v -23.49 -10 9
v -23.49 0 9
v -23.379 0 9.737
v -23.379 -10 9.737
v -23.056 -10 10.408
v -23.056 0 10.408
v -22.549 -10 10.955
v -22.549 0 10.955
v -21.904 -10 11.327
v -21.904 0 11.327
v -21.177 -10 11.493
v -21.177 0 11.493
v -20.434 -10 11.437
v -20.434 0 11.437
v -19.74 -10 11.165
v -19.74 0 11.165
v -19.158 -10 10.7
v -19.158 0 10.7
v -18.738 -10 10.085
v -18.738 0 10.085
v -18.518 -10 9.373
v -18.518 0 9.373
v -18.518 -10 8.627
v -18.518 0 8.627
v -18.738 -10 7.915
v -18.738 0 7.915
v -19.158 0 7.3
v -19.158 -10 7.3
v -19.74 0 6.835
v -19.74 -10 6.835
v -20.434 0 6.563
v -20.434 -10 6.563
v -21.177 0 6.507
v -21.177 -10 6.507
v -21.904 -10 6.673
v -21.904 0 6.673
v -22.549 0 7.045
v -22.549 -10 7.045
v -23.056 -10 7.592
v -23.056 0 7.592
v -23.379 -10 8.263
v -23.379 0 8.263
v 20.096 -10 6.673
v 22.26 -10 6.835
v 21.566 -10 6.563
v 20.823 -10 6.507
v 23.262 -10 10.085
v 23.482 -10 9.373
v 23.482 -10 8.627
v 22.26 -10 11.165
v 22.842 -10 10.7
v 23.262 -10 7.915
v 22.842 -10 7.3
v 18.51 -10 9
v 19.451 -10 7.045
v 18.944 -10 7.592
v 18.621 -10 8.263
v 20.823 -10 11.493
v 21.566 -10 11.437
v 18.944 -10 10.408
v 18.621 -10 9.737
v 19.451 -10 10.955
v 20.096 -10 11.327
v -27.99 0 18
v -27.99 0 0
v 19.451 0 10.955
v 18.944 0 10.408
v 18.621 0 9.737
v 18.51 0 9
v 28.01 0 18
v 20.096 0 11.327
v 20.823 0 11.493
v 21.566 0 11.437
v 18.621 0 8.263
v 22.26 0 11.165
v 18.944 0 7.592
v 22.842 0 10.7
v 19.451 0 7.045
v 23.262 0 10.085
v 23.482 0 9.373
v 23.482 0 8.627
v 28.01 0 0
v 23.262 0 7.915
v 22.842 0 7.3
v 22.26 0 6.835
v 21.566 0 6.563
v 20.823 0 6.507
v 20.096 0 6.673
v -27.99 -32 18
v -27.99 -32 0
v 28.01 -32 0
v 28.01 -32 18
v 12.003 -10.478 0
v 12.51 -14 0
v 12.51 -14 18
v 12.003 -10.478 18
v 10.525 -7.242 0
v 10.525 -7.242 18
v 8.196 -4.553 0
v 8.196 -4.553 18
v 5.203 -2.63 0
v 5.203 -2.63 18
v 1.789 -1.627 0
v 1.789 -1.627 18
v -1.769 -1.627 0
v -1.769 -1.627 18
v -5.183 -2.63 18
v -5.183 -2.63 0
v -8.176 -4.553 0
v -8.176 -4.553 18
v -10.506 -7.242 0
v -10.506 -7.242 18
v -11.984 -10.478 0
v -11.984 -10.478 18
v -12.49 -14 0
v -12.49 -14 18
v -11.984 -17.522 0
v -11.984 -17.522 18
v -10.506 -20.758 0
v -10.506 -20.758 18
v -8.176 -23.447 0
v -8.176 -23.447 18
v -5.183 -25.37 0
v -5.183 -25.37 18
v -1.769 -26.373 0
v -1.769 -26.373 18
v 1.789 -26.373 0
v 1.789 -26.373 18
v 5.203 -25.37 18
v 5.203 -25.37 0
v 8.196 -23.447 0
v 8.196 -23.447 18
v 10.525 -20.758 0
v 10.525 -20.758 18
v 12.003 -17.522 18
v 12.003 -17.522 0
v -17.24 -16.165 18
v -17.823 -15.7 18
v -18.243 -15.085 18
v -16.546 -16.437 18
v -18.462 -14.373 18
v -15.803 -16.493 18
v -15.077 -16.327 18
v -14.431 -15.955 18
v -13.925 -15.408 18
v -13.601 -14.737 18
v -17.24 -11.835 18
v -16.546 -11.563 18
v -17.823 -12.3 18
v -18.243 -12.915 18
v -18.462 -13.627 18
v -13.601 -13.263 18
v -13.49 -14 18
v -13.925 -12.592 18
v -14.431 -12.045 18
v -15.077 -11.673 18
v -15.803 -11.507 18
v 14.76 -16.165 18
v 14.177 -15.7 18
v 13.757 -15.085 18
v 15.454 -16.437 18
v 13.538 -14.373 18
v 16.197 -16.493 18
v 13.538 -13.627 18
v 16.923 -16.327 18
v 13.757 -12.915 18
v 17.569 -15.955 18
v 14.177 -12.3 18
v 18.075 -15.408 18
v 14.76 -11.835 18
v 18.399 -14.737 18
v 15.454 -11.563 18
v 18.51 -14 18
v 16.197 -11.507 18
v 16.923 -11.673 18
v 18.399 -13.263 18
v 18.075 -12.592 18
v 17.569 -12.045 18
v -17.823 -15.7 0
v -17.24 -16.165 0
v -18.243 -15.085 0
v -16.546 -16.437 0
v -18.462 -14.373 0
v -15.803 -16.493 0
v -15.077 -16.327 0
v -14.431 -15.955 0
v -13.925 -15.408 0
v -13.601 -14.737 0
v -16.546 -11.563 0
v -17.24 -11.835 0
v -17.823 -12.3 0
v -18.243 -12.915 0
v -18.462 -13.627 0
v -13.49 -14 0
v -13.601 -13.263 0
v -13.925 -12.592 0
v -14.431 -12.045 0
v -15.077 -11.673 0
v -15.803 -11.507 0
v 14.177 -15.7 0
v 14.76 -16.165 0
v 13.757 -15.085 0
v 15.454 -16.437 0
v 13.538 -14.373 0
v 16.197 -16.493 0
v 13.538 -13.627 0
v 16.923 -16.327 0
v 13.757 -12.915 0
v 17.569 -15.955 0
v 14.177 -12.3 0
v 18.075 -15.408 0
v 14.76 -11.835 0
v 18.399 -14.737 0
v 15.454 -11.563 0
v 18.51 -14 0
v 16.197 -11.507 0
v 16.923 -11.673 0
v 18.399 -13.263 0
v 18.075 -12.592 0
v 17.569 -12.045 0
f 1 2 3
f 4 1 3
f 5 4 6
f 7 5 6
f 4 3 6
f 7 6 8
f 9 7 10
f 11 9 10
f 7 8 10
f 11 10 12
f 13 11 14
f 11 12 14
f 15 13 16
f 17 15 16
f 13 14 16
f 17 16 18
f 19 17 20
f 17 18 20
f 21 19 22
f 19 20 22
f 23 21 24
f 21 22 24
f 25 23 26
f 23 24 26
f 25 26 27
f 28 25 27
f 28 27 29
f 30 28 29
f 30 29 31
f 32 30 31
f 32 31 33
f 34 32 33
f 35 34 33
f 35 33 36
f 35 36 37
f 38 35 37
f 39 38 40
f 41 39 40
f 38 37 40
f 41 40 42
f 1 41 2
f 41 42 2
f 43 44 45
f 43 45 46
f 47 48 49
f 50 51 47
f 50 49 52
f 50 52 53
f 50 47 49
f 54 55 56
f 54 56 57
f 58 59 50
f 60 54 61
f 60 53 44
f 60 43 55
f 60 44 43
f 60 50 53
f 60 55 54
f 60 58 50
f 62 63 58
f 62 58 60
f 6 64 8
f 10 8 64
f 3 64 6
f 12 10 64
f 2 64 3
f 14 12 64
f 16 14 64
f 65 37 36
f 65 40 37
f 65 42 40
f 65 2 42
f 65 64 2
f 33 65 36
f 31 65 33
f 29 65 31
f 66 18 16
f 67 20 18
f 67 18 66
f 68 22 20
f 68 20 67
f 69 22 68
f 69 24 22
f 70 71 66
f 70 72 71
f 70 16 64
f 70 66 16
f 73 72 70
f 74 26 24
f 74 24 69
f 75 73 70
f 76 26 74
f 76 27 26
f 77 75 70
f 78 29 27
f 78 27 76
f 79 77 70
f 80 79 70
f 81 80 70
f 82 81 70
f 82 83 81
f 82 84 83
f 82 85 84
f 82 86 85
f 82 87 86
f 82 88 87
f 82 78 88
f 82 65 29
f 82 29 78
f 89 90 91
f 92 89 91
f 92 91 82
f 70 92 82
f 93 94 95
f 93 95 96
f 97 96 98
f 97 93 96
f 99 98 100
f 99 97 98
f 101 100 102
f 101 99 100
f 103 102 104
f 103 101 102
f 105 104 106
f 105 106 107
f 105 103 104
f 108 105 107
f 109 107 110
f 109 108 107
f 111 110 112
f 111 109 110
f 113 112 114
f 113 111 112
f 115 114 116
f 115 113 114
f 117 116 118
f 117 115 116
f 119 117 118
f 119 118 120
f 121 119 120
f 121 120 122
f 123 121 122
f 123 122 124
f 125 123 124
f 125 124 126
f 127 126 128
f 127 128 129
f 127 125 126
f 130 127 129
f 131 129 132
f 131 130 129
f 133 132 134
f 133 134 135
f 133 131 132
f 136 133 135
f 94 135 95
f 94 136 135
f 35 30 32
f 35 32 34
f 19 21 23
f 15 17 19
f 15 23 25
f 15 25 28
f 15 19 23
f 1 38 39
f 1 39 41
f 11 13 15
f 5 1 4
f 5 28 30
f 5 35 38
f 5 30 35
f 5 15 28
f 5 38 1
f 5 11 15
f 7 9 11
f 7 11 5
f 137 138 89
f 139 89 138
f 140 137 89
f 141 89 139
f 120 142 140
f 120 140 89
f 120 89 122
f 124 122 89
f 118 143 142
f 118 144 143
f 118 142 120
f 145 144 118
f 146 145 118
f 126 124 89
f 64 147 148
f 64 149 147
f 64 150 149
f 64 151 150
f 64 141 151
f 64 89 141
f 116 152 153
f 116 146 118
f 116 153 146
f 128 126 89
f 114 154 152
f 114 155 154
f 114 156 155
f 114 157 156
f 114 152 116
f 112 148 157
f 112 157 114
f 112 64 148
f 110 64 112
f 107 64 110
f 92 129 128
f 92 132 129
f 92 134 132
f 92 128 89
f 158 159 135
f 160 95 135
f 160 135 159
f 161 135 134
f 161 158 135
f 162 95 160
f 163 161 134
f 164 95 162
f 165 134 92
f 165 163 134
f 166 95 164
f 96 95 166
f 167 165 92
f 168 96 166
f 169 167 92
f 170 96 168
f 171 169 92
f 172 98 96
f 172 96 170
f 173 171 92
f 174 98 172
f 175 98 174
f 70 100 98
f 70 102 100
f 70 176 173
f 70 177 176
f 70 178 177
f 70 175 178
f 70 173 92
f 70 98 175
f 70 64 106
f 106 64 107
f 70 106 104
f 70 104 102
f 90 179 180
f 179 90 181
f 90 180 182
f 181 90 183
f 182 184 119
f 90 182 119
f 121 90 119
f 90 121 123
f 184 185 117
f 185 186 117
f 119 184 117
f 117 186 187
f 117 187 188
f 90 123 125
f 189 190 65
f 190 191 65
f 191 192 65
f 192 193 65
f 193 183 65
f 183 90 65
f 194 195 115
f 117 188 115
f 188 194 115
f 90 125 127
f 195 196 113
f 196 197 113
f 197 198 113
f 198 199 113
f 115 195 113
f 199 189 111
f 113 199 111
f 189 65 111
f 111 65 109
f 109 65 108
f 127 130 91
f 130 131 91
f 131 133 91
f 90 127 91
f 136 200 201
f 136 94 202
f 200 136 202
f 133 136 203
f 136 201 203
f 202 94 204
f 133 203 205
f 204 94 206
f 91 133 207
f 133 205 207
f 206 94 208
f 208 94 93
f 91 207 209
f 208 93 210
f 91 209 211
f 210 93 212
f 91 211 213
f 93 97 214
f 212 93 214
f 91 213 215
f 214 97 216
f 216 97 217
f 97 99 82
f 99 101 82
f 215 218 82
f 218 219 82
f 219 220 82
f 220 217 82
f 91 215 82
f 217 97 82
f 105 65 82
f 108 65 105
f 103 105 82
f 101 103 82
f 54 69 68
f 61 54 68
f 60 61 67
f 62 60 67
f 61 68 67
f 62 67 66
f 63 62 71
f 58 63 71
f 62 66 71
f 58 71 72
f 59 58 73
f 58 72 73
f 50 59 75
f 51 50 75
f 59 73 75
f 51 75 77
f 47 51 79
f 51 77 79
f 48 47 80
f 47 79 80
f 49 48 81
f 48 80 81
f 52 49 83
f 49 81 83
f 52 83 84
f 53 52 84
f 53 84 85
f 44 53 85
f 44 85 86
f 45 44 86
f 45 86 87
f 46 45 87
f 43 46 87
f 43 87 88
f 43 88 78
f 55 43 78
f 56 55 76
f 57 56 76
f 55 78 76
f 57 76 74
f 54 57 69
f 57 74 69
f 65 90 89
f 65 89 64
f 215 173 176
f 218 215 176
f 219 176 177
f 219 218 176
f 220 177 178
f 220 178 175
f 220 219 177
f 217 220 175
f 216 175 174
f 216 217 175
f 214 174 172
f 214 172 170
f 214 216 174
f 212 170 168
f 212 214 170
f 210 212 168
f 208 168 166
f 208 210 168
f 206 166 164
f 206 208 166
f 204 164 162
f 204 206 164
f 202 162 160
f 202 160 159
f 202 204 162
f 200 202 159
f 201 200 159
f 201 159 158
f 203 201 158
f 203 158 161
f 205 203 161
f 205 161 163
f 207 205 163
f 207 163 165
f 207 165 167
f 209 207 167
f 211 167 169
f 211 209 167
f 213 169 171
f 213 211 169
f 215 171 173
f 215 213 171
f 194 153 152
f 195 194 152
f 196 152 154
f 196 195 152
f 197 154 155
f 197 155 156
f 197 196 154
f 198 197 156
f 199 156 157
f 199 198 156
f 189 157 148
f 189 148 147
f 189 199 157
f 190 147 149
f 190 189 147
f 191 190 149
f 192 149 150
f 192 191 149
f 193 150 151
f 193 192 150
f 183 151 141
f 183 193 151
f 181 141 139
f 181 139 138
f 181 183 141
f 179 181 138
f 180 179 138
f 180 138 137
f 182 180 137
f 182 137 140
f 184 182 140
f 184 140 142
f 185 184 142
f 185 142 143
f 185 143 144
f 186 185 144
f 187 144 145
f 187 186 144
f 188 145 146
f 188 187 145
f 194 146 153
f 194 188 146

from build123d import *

# Parameters (mm, degrees)
F0_W     = 56
F0_H     = 32
F0_R     = 2.5
F0_R_2   = 12.5
F1_DEPTH = 18
F3_DEPTH = 10


with BuildPart() as f1:
    # F0 (on Top) → F1 (new body)
    with BuildSketch(Plane.XY):
        with Locations((0.009827, -16)):
            Rectangle(F0_W, F0_H)
        with Locations((-15.990173, -14)):
            Circle(F0_R, mode=Mode.SUBTRACT)
        with Locations((0.009827, -14)):
            Circle(F0_R_2, mode=Mode.SUBTRACT)
        with Locations((16.009827, -14)):
            Circle(F0_R, mode=Mode.SUBTRACT)
    extrude(amount=F1_DEPTH)

    # F2 (on face) → F3 (cut)
    with BuildSketch(Plane(origin=(0, 0, 0), x_dir=(-1, 0, 0), z_dir=(0, 1, 0))):
        with BuildLine():
            ThreePointArc((18.490173, 9), (20.990173, 6.5), (23.490173, 9))
            Line((23.490173, 9), (18.490173, 9))
        make_face()
        with BuildLine():
            Line((18.490173, 9), (23.490173, 9))
            ThreePointArc((23.490173, 9), (20.990173, 11.5), (18.490173, 9))
        make_face()
        with BuildLine():
            ThreePointArc((-23.509827, 9), (-21.009827, 6.5), (-18.509827, 9))
            Line((-18.509827, 9), (-23.509827, 9))
        make_face()
        with BuildLine():
            Line((-23.509827, 9), (-18.509827, 9))
            ThreePointArc((-18.509827, 9), (-21.009827, 11.5), (-23.509827, 9))
        make_face()
    extrude(amount=-F3_DEPTH, mode=Mode.SUBTRACT)


solid = f1.part
